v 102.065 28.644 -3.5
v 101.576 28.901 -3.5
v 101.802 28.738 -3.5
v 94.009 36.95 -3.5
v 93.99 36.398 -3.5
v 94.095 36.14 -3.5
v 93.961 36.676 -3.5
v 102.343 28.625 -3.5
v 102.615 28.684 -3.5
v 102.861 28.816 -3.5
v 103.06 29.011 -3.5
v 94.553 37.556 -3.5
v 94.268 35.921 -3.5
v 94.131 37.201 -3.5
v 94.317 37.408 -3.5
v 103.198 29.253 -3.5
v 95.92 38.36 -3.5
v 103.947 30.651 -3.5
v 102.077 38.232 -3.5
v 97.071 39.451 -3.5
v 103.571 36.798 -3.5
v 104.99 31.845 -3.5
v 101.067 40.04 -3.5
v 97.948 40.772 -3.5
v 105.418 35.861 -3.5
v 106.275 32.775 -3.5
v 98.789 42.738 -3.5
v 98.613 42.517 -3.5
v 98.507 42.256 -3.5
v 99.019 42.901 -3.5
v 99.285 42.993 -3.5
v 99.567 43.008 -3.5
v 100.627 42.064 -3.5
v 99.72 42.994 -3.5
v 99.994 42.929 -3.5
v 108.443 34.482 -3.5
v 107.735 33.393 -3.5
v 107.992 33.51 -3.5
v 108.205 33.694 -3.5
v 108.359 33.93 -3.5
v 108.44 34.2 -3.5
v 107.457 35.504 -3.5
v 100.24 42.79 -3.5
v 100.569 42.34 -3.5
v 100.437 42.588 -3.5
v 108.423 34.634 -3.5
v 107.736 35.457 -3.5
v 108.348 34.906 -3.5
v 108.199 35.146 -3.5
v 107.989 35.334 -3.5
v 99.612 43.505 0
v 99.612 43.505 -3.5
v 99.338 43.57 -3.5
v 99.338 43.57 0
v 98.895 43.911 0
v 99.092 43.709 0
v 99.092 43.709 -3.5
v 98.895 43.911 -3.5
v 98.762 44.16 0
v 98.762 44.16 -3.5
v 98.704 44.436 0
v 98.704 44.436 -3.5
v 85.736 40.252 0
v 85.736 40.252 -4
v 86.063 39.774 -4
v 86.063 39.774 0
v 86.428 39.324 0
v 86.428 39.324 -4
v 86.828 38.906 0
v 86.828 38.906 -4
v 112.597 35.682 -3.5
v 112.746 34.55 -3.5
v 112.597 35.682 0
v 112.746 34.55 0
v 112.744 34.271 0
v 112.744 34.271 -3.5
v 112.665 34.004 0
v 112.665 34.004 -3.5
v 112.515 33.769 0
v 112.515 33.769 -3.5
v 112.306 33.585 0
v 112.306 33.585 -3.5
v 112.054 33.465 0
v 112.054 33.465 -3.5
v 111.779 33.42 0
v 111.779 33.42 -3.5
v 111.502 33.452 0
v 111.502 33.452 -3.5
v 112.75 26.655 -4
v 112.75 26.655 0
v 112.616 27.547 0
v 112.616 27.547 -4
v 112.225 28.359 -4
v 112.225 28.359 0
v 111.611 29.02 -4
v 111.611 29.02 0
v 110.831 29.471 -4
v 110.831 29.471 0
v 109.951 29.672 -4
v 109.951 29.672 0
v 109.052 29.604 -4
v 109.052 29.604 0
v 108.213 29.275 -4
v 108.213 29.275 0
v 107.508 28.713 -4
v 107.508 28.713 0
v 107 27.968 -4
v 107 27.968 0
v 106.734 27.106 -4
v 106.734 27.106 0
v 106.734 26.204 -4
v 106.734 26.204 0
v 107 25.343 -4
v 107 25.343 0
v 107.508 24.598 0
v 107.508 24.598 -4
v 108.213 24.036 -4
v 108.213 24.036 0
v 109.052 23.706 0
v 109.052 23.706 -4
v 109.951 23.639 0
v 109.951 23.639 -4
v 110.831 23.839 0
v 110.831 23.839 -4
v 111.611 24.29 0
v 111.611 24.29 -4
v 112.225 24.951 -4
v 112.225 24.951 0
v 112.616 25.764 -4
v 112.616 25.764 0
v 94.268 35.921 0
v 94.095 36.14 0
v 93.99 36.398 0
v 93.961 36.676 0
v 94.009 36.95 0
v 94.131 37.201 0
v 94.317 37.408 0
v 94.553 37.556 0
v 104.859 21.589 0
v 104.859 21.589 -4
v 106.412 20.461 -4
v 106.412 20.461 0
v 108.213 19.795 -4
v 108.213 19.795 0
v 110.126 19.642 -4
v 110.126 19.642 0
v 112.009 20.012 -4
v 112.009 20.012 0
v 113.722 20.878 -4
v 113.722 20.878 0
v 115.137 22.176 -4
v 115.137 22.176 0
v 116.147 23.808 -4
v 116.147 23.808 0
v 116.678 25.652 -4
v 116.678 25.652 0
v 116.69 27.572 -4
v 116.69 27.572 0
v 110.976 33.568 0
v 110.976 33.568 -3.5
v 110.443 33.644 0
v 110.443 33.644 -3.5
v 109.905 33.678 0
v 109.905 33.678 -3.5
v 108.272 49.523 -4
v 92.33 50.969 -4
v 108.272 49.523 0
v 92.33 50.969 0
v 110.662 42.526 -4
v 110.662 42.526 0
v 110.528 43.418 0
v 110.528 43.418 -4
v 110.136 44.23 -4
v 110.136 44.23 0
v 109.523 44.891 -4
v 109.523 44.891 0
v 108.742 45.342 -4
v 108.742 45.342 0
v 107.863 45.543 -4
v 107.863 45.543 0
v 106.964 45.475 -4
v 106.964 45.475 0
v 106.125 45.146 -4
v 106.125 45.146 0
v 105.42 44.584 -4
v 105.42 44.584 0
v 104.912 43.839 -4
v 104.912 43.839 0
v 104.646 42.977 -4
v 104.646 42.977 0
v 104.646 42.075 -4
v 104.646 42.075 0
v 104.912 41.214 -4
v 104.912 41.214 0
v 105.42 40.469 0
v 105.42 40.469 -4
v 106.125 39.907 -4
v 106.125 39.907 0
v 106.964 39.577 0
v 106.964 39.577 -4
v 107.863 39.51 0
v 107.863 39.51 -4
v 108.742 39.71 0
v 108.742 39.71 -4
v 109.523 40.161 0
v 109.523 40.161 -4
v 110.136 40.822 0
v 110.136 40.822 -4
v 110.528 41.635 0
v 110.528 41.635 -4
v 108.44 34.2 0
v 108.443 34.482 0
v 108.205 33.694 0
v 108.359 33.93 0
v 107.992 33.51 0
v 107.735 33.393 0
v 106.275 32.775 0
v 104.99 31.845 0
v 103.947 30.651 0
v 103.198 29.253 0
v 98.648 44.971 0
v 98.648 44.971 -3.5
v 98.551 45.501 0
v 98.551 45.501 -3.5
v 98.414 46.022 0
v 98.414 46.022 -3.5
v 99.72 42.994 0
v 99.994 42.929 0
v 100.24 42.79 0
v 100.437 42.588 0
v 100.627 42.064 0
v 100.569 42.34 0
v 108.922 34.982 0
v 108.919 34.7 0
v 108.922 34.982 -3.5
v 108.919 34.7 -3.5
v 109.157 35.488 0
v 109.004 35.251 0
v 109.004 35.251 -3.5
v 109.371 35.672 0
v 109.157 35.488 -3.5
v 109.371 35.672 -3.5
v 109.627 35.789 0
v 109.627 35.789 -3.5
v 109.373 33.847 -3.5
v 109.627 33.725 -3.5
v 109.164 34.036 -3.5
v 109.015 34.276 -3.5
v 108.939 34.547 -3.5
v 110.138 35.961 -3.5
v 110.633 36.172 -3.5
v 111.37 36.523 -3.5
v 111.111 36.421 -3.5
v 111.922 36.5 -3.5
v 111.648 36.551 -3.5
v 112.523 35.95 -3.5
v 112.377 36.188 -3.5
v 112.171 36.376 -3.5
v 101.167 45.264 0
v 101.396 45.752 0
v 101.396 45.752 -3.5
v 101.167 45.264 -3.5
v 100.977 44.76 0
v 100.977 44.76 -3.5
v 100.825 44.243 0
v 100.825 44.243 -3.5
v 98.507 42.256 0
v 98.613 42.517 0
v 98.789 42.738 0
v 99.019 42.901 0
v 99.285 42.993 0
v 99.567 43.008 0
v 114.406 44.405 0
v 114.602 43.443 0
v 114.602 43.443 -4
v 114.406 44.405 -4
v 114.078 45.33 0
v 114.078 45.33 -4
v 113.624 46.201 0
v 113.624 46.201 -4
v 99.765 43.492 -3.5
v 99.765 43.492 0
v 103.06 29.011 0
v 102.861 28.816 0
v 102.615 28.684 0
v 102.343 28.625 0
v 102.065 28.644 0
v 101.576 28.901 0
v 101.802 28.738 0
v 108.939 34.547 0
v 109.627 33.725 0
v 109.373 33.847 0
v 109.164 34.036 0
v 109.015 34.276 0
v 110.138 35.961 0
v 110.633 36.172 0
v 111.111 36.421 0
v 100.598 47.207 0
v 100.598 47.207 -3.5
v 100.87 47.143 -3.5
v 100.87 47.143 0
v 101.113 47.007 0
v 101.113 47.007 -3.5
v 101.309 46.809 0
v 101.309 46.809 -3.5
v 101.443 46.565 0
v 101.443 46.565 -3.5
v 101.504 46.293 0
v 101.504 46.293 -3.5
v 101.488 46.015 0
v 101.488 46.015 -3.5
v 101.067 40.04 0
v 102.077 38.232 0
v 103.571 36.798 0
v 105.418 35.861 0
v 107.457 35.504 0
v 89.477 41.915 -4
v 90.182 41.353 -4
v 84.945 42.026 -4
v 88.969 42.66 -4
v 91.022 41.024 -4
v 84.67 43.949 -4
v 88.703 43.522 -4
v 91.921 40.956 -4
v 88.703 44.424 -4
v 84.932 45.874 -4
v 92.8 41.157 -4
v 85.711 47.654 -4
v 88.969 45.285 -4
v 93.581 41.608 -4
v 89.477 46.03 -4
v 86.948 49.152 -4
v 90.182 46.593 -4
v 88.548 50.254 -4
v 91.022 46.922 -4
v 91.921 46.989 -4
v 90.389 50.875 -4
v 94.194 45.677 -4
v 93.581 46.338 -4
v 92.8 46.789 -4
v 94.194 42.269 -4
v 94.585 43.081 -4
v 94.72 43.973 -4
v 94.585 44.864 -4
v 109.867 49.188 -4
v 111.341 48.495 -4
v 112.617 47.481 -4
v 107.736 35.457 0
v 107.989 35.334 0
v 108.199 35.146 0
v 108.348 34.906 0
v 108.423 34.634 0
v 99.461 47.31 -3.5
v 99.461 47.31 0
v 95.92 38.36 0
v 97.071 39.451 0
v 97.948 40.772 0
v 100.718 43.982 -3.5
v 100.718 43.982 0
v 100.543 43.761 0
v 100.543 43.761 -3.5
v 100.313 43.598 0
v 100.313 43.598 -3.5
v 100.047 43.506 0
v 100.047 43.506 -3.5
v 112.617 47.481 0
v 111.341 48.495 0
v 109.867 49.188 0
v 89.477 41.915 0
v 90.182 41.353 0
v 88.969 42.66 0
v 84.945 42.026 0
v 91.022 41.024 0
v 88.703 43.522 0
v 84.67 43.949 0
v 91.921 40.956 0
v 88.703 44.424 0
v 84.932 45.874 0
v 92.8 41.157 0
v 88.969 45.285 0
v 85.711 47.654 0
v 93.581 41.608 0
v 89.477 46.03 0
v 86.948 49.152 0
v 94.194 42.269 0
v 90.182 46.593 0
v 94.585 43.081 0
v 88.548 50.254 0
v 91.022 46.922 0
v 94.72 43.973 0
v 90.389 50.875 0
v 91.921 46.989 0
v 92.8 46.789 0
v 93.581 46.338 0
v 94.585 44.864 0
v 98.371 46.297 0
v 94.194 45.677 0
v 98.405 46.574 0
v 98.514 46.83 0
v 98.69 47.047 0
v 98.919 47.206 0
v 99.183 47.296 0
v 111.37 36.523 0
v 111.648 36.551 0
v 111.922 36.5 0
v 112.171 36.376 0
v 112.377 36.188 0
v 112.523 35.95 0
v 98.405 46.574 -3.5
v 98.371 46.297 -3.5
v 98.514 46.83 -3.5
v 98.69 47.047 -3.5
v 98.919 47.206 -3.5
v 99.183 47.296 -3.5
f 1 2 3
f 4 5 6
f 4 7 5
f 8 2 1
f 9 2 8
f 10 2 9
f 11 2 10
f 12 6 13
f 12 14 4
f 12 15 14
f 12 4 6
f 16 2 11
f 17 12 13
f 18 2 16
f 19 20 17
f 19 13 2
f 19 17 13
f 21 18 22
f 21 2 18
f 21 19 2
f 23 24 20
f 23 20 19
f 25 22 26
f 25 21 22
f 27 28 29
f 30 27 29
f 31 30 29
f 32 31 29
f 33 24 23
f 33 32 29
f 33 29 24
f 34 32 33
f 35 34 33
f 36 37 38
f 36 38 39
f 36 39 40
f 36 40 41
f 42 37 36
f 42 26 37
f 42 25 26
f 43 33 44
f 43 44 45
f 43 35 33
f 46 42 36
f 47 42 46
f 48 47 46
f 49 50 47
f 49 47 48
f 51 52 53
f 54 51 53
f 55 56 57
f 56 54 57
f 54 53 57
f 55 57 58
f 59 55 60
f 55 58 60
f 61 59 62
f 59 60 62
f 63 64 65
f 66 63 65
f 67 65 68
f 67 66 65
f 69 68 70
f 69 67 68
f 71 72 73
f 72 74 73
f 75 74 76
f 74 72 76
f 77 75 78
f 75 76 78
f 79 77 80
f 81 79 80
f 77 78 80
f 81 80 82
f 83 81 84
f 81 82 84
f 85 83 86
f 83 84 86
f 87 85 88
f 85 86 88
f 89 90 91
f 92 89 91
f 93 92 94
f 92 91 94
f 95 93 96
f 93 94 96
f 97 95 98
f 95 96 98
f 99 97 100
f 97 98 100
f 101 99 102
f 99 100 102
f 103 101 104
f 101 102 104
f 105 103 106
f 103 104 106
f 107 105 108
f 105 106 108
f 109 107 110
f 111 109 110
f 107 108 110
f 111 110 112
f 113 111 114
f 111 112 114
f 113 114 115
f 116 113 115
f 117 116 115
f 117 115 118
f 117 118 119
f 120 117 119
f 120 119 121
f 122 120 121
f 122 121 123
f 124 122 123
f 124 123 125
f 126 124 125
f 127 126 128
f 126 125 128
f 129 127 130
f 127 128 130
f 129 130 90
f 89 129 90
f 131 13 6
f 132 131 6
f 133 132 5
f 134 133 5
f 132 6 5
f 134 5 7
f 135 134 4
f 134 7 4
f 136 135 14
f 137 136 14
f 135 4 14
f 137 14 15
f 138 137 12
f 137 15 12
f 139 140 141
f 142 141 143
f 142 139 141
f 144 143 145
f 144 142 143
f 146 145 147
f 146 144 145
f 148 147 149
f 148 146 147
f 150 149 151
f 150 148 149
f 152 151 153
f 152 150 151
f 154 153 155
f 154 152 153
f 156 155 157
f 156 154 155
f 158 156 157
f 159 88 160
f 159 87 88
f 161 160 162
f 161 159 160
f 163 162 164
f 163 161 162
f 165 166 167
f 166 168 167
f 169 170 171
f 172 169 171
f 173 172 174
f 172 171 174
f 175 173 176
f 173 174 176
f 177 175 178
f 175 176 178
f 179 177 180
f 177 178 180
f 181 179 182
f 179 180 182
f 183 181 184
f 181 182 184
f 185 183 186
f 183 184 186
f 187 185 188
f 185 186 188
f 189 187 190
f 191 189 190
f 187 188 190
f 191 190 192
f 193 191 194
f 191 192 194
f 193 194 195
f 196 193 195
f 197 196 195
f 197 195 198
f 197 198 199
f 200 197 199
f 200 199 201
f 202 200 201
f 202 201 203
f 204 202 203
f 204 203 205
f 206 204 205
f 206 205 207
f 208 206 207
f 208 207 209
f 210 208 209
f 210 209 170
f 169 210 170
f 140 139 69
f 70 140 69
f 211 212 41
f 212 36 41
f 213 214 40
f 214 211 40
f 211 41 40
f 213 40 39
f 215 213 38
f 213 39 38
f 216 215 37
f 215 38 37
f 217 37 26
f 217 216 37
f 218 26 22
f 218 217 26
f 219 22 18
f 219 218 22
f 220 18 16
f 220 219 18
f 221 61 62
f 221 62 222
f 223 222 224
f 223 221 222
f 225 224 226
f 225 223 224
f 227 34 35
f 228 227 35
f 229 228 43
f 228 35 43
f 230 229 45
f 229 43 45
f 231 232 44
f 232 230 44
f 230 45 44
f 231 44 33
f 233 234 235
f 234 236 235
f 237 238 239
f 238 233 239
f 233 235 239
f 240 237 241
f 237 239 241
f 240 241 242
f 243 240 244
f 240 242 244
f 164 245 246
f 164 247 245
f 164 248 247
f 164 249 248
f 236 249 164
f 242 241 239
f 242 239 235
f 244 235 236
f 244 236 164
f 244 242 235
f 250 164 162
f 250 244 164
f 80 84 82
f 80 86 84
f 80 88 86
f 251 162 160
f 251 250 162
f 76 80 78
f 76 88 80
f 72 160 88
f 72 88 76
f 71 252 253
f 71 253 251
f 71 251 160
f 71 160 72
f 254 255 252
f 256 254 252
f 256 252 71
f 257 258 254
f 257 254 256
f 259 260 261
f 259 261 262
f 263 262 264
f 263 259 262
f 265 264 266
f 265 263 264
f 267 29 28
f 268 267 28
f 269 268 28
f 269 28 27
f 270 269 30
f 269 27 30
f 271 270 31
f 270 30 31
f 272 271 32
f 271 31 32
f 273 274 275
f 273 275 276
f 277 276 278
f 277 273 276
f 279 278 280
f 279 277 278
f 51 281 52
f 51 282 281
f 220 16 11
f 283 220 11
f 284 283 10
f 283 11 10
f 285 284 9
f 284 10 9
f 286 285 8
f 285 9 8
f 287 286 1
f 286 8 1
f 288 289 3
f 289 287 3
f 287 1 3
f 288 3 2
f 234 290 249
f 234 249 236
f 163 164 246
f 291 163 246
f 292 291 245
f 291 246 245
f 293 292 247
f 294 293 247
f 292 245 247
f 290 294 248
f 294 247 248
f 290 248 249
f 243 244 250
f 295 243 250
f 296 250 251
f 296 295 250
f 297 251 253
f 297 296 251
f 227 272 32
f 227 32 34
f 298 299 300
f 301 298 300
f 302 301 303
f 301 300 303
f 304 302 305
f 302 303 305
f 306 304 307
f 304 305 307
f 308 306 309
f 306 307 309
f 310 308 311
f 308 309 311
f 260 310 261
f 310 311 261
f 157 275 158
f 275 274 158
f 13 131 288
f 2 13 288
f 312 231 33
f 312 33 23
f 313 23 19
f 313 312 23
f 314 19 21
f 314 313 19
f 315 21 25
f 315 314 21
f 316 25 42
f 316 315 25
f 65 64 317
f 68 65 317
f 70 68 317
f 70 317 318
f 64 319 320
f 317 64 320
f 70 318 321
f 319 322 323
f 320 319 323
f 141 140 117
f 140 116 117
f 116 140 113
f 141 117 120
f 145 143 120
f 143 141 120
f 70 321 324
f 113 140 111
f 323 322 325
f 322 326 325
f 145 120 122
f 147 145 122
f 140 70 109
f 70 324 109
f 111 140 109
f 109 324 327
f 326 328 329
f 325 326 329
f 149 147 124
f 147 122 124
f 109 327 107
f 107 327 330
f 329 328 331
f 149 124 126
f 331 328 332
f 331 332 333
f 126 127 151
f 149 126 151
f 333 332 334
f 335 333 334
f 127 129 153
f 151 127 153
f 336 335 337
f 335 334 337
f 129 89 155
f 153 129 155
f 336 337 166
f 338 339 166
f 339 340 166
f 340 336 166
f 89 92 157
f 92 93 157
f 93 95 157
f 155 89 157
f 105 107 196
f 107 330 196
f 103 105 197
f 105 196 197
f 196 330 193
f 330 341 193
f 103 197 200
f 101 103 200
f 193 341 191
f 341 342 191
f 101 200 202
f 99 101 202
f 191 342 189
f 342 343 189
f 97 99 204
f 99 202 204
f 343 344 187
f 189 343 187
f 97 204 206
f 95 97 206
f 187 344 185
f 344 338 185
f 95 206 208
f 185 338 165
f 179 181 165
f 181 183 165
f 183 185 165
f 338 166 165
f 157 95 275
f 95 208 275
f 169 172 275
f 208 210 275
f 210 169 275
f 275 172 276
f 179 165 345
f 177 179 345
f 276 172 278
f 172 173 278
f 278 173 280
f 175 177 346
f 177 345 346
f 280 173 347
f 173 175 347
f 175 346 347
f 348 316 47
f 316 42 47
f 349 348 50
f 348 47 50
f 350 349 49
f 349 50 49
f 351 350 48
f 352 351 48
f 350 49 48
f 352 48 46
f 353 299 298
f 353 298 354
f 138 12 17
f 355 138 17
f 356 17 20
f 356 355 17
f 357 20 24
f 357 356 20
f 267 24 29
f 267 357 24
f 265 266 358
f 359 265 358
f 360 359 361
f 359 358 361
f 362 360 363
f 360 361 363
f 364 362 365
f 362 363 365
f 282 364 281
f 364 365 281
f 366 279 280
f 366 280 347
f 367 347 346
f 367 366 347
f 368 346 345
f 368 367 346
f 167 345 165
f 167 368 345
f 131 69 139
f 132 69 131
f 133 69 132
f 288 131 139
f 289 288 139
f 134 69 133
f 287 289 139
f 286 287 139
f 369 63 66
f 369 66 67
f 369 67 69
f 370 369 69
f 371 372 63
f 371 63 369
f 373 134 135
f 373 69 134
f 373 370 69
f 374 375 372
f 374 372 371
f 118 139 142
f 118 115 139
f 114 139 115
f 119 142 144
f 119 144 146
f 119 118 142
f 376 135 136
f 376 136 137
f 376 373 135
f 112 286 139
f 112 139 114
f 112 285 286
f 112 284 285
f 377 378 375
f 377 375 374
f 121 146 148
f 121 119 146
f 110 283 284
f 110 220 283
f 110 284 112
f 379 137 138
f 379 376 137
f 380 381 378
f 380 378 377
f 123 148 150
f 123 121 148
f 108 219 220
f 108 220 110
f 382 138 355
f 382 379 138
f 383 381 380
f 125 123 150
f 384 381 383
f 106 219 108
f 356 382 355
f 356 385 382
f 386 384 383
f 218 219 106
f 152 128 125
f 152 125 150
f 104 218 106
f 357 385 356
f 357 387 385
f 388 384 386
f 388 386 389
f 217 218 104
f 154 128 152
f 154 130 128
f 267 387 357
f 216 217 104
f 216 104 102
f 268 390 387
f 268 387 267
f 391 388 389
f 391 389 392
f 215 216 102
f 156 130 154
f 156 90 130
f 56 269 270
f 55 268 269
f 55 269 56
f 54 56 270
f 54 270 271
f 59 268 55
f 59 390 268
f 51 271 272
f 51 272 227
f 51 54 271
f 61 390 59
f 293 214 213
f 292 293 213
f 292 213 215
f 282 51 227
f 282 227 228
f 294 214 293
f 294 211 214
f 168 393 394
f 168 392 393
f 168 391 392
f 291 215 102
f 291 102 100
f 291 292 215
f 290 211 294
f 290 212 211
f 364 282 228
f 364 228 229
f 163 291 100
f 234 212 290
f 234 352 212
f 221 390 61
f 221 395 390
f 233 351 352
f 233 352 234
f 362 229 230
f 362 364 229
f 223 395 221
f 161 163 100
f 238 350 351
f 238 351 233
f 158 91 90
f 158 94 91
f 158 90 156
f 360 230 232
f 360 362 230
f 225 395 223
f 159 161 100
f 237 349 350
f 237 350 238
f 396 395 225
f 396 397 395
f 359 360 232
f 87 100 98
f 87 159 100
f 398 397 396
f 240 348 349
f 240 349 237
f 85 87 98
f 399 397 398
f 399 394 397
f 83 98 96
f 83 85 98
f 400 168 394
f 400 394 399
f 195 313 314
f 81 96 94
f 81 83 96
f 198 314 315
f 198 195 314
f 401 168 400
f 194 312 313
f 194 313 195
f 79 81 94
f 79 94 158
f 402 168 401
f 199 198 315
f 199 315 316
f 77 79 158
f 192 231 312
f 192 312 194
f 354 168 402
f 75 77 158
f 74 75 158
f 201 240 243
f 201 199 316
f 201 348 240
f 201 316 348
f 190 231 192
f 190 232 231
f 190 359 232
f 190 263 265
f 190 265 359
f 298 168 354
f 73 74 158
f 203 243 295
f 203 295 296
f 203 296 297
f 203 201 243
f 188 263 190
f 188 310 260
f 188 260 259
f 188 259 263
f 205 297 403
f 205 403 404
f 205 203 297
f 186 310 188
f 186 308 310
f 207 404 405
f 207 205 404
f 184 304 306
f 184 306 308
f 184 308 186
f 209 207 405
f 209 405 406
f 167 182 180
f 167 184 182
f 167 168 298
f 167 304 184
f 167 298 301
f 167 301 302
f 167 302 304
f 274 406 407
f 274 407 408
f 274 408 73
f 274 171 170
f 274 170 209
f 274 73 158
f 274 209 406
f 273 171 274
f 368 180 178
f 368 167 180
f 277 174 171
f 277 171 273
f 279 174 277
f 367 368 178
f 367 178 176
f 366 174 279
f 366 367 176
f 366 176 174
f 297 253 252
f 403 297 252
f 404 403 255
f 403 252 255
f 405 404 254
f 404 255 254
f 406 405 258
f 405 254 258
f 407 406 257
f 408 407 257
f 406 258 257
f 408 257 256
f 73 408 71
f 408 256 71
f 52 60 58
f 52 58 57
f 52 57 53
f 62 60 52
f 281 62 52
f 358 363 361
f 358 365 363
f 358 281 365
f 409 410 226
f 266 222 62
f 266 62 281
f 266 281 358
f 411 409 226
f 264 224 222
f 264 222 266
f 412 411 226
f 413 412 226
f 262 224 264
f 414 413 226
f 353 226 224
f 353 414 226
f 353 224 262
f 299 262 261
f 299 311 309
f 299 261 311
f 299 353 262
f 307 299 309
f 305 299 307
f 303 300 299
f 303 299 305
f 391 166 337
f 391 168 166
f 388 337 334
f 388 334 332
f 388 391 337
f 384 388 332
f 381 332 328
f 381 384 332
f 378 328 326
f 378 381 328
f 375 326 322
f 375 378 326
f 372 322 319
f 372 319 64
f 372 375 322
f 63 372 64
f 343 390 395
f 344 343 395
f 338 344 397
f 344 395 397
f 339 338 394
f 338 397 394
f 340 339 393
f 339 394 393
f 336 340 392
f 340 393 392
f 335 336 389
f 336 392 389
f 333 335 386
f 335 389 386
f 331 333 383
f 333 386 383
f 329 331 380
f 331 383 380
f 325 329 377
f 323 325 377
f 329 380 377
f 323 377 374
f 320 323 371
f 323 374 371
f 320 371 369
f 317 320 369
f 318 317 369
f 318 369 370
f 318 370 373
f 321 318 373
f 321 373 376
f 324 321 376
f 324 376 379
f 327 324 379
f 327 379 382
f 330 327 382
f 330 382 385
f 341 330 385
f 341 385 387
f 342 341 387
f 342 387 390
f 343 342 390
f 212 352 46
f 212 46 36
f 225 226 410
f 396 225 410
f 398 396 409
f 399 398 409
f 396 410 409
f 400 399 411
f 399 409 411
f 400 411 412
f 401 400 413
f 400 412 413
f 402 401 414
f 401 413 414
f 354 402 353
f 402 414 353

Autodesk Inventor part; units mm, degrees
ref_plane "YZ Plane" through (0, 0, 0) normal (1, 0, 0) x (0, 1, 0)
ref_plane "XZ Plane" through (0, 0, 0) normal (0, 1, 0) x (-1, 0, 0)
ref_plane "XY Plane" through (0, 0, 0) normal (0, 0, 1) x (1, 0, 0)
sketch "スケッチ1" plane through (0, 0, 0) normal (0, 0, 1) x (1, 0, 0)
  circle A0 centre (68.955, 78.0364) radius 1.25
  arc A1 (82.2061, 79.4541) -> (58.0365, 100.3664) centre (53.5087, 70.7101) ccw
  arc A2 (58.0365, 100.3664) -> (49.826, 85.6345) centre (56.6782, 91.4695) ccw
  line L0 (78.21, 52.3031) -> (49.826, 85.6345)
  line L1 (85.7362, 40.2517) -> (78.21, 52.3031)
  arc A3 (85.7362, 40.2517) -> (86.8285, 38.9062) centre (91.6947, 43.9728) ccw
  line L2 (104.8592, 21.5887) -> (86.8285, 38.9062)
  arc A4 (104.8592, 21.5887) -> (116.6904, 27.5718) centre (109.7254, 26.6553) ccw
  line L3 (114.602, 43.4428) -> (116.6904, 27.5718)
  arc A5 (114.602, 43.4428) -> (113.6245, 46.2008) centre (107.6371, 42.5263) ccw
  line L4 (100.6394, 67.3594) -> (113.6245, 46.2008)
  arc A6 (100.6394, 67.3594) -> (89.5888, 73.7904) centre (89.1334, 60.2981) ccw
  arc A7 (82.2061, 79.4541) -> (89.5888, 73.7904) centre (89.8587, 81.7859) ccw
  circle A8 centre (89.1334, 60.2981) radius 8.525
  circle A9 centre (109.7254, 26.6553) radius 3.025
  circle A10 centre (107.6371, 42.5263) radius 3.025
  circle A11 centre (91.6947, 43.9728) radius 3.025
  circle A12 centre (56.6782, 91.4695) radius 1.25
  circle A13 centre (109.7254, 26.6553) radius 7.025
  circle A14 centre (91.6947, 43.9728) radius 7.025
  circle A15 centre (107.6371, 42.5263) radius 7.025
  line L5 (92.3295, 50.9691) -> (108.2718, 49.5226)
  point P0 (0, 0)
  point P1 (0, 0)
extrude "押し出し1" add sketch "スケッチ1" against normal blind 4 contours A5 A15 | A14 A3 | L3 A13 L2 A14 L5 A15 | A4 A13
sketch "スケッチ2" plane through (0, 0, 0) normal (0, 0, 1) x (1, 0, 0)
  arc A0 (104.8592, 21.5887) -> (116.6904, 27.5718) centre (109.7254, 26.6553) ccw projected
  line L0 (116.6904, 27.5718) -> (114.602, 43.4428) projected
  arc A1 (114.602, 43.4428) -> (108.2718, 49.5226) centre (107.6371, 42.5263) ccw projected
  line L1 (108.2718, 49.5226) -> (92.3295, 50.9691) projected
  arc A2 (92.3295, 50.9691) -> (86.8285, 38.9062) centre (91.6947, 43.9728) ccw projected
  line L2 (86.8285, 38.9062) -> (104.8592, 21.5887) projected
  circle A3 centre (107.6371, 42.5263) radius 3.025 projected
  circle A4 centre (109.7254, 26.6553) radius 3.025 projected
  circle A5 centre (91.6947, 43.9728) radius 3.025 projected
  line L3 (108.2718, 49.5226) -> (92.3295, 50.9691) projected
  circle A6 centre (109.7254, 26.6553) radius 3.025 projected
  arc A7 (104.8592, 21.5887) -> (116.6904, 27.5718) centre (109.7254, 26.6553) ccw projected
  point P0 (0, 0)
sketch "スケッチ3" plane through (0, 0, 0) normal (0, 0, 1) x (1, 0, 0)
  arc A0 (104.8592, 21.5887) -> (116.6904, 27.5718) centre (109.7254, 26.6553) ccw projected
  line L0 (116.6904, 27.5718) -> (114.602, 43.4428) projected
  arc A1 (114.602, 43.4428) -> (108.2718, 49.5226) centre (107.6371, 42.5263) ccw projected
  line L1 (108.2718, 49.5226) -> (92.3295, 50.9691) projected
  arc A2 (92.3295, 50.9691) -> (86.8285, 38.9062) centre (91.6947, 43.9728) ccw projected
  line L2 (86.8285, 38.9062) -> (104.8592, 21.5887) projected
  circle A3 centre (107.6371, 42.5263) radius 3.025 projected
  circle A4 centre (109.7254, 26.6553) radius 3.025 projected
  circle A5 centre (91.6947, 43.9728) radius 3.025 projected
  arc A6 (106.9373, 23.7524) -> (113.716, 27.1804) centre (109.7254, 26.6553) ccw
  line L3 (113.716, 27.1804) -> (111.6277, 43.0514)
  arc A7 (111.6277, 43.0514) -> (108.0008, 46.5349) centre (107.6371, 42.5263) ccw
  line L4 (108.0008, 46.5349) -> (92.0584, 47.9813)
  arc A8 (92.0584, 47.9813) -> (88.9066, 41.0699) centre (91.6947, 43.9728) ccw
  line L5 (88.9066, 41.0699) -> (106.9373, 23.7524)
  line L6 (104.8592, 21.5887) -> (86.8285, 38.9062) projected
  circle A9 centre (91.6947, 43.9728) radius 7.025
  line L7 (114.602, 43.4428) -> (116.6904, 27.5718) projected
  circle A10 centre (107.6371, 42.5263) radius 7.025
  circle A11 centre (109.7254, 26.6553) radius 7.025
  point P0 (0, 0)
  point P1 (102.7848, 27.7407)
  point P2 (112.9649, 32.8888)
  point P3 (112.3788, 37.343)
  point P4 (102.2667, 47.0551)
  point P5 (97.7925, 47.4611)
  point P6 (93.0592, 37.0816)
  dimension "d2" = 3
extrude "押し出し2" cut sketch "スケッチ3" against normal blind 3.5 contours L5 A9 L4 A10 L3 A11
sketch "スケッチ4" plane through (0, 0, 0) normal (0, 0, 1) x (1, 0, 0)
  line L0 (112.3788, 37.343) -> (112.9649, 32.8888) projected
  arc A0 (112.9649, 32.8888) -> (102.7848, 27.7407) centre (109.7254, 26.6553) ccw projected
  line L1 (102.7848, 27.7407) -> (93.0592, 37.0816) projected
  arc A1 (93.0592, 37.0816) -> (97.7925, 47.4611) centre (91.6947, 43.9728) ccw projected
  line L2 (97.7925, 47.4611) -> (102.2667, 47.0551) projected
  arc A2 (102.2667, 47.0551) -> (112.3788, 37.343) centre (107.6371, 42.5263) ccw projected
  arc A3 (104.8592, 21.5887) -> (116.6904, 27.5718) centre (109.7254, 26.6553) ccw projected
  line L3 (116.6904, 27.5718) -> (114.602, 43.4428) projected
  arc A4 (114.602, 43.4428) -> (108.2718, 49.5226) centre (107.6371, 42.5263) ccw projected
  line L4 (108.2718, 49.5226) -> (92.3295, 50.9691) projected
  arc A5 (92.3295, 50.9691) -> (86.8285, 38.9062) centre (91.6947, 43.9728) ccw projected
  line L5 (86.8285, 38.9062) -> (104.8592, 21.5887) projected
  circle A6 centre (107.6371, 42.5263) radius 3.025 projected
  circle A7 centre (109.7254, 26.6553) radius 3.025 projected
  circle A8 centre (91.6947, 43.9728) radius 3.025 projected
  arc A9 (102.2667, 47.0551) -> (112.3788, 37.343) centre (107.6371, 42.5263) ccw projected
  line L6 (91.6947, 43.9728) -> (107.6371, 42.5263) construction
  line L7 (91.6722, 43.7238) -> (107.6145, 42.2774)
  line L8 (107.6597, 42.7753) -> (91.7173, 44.2218)
  arc A10 (91.7173, 44.2218) -> (91.6722, 43.7238) centre (91.6947, 43.9728) ccw
  arc A11 (107.6145, 42.2774) -> (107.6597, 42.7753) centre (107.6371, 42.5263) ccw
  line L9 (107.6371, 42.5263) -> (109.7254, 26.6553) construction
  line L10 (107.3892, 42.4937) -> (109.4776, 26.6227)
  line L11 (109.9733, 26.688) -> (107.8849, 42.559)
  arc A12 (107.8849, 42.559) -> (107.3892, 42.4937) centre (107.6371, 42.5263) ccw
  arc A13 (109.4776, 26.6227) -> (109.9733, 26.688) centre (109.7254, 26.6553) ccw
  point P0 (0, 0)
  point P1 (99.6659, 43.2496)
  point P2 (108.6812, 34.5908)
  point P3 (109.0574, 33.6485)
  point P4 (108.8008, 35.5984)
  point P5 (108.3051, 35.5332)
  point P6 (108.5617, 33.5833)
  point P7 (100.6678, 43.4097)
  point P8 (98.7092, 43.5874)
  point P9 (98.664, 43.0895)
  point P10 (100.6227, 42.9117)
  dimension "d9" = 0.5
  dimension "d10" = 0.5
extrude "押し出し3" add sketch "スケッチ4" against normal blind 4 contours L11 A0 L10 A2 | L7 A1 L8 A2
fillet "フィレット1" radius 1 14 edges at (97.7925, 47.4611, -1.75) (102.2667, 47.0551, -1.75) (98.7092, 43.5874, -1.75) (98.664, 43.0895, -1.75) (100.6678, 43.4097, -1.75) (100.6227, 42.9117, -1.75) (93.0592, 37.0816, -1.75) (112.3788, 37.343, -1.75) (112.9649, 32.8888, -1.75) (108.8008, 35.5984, -1.75) (108.3051, 35.5332, -1.75) (109.0574, 33.6485, -1.75) (108.5617, 33.5833, -1.75) (102.7848, 27.7407, -1.75)
properties part number "アーム 中間節 中詰め" material "ABS プラスチック"
